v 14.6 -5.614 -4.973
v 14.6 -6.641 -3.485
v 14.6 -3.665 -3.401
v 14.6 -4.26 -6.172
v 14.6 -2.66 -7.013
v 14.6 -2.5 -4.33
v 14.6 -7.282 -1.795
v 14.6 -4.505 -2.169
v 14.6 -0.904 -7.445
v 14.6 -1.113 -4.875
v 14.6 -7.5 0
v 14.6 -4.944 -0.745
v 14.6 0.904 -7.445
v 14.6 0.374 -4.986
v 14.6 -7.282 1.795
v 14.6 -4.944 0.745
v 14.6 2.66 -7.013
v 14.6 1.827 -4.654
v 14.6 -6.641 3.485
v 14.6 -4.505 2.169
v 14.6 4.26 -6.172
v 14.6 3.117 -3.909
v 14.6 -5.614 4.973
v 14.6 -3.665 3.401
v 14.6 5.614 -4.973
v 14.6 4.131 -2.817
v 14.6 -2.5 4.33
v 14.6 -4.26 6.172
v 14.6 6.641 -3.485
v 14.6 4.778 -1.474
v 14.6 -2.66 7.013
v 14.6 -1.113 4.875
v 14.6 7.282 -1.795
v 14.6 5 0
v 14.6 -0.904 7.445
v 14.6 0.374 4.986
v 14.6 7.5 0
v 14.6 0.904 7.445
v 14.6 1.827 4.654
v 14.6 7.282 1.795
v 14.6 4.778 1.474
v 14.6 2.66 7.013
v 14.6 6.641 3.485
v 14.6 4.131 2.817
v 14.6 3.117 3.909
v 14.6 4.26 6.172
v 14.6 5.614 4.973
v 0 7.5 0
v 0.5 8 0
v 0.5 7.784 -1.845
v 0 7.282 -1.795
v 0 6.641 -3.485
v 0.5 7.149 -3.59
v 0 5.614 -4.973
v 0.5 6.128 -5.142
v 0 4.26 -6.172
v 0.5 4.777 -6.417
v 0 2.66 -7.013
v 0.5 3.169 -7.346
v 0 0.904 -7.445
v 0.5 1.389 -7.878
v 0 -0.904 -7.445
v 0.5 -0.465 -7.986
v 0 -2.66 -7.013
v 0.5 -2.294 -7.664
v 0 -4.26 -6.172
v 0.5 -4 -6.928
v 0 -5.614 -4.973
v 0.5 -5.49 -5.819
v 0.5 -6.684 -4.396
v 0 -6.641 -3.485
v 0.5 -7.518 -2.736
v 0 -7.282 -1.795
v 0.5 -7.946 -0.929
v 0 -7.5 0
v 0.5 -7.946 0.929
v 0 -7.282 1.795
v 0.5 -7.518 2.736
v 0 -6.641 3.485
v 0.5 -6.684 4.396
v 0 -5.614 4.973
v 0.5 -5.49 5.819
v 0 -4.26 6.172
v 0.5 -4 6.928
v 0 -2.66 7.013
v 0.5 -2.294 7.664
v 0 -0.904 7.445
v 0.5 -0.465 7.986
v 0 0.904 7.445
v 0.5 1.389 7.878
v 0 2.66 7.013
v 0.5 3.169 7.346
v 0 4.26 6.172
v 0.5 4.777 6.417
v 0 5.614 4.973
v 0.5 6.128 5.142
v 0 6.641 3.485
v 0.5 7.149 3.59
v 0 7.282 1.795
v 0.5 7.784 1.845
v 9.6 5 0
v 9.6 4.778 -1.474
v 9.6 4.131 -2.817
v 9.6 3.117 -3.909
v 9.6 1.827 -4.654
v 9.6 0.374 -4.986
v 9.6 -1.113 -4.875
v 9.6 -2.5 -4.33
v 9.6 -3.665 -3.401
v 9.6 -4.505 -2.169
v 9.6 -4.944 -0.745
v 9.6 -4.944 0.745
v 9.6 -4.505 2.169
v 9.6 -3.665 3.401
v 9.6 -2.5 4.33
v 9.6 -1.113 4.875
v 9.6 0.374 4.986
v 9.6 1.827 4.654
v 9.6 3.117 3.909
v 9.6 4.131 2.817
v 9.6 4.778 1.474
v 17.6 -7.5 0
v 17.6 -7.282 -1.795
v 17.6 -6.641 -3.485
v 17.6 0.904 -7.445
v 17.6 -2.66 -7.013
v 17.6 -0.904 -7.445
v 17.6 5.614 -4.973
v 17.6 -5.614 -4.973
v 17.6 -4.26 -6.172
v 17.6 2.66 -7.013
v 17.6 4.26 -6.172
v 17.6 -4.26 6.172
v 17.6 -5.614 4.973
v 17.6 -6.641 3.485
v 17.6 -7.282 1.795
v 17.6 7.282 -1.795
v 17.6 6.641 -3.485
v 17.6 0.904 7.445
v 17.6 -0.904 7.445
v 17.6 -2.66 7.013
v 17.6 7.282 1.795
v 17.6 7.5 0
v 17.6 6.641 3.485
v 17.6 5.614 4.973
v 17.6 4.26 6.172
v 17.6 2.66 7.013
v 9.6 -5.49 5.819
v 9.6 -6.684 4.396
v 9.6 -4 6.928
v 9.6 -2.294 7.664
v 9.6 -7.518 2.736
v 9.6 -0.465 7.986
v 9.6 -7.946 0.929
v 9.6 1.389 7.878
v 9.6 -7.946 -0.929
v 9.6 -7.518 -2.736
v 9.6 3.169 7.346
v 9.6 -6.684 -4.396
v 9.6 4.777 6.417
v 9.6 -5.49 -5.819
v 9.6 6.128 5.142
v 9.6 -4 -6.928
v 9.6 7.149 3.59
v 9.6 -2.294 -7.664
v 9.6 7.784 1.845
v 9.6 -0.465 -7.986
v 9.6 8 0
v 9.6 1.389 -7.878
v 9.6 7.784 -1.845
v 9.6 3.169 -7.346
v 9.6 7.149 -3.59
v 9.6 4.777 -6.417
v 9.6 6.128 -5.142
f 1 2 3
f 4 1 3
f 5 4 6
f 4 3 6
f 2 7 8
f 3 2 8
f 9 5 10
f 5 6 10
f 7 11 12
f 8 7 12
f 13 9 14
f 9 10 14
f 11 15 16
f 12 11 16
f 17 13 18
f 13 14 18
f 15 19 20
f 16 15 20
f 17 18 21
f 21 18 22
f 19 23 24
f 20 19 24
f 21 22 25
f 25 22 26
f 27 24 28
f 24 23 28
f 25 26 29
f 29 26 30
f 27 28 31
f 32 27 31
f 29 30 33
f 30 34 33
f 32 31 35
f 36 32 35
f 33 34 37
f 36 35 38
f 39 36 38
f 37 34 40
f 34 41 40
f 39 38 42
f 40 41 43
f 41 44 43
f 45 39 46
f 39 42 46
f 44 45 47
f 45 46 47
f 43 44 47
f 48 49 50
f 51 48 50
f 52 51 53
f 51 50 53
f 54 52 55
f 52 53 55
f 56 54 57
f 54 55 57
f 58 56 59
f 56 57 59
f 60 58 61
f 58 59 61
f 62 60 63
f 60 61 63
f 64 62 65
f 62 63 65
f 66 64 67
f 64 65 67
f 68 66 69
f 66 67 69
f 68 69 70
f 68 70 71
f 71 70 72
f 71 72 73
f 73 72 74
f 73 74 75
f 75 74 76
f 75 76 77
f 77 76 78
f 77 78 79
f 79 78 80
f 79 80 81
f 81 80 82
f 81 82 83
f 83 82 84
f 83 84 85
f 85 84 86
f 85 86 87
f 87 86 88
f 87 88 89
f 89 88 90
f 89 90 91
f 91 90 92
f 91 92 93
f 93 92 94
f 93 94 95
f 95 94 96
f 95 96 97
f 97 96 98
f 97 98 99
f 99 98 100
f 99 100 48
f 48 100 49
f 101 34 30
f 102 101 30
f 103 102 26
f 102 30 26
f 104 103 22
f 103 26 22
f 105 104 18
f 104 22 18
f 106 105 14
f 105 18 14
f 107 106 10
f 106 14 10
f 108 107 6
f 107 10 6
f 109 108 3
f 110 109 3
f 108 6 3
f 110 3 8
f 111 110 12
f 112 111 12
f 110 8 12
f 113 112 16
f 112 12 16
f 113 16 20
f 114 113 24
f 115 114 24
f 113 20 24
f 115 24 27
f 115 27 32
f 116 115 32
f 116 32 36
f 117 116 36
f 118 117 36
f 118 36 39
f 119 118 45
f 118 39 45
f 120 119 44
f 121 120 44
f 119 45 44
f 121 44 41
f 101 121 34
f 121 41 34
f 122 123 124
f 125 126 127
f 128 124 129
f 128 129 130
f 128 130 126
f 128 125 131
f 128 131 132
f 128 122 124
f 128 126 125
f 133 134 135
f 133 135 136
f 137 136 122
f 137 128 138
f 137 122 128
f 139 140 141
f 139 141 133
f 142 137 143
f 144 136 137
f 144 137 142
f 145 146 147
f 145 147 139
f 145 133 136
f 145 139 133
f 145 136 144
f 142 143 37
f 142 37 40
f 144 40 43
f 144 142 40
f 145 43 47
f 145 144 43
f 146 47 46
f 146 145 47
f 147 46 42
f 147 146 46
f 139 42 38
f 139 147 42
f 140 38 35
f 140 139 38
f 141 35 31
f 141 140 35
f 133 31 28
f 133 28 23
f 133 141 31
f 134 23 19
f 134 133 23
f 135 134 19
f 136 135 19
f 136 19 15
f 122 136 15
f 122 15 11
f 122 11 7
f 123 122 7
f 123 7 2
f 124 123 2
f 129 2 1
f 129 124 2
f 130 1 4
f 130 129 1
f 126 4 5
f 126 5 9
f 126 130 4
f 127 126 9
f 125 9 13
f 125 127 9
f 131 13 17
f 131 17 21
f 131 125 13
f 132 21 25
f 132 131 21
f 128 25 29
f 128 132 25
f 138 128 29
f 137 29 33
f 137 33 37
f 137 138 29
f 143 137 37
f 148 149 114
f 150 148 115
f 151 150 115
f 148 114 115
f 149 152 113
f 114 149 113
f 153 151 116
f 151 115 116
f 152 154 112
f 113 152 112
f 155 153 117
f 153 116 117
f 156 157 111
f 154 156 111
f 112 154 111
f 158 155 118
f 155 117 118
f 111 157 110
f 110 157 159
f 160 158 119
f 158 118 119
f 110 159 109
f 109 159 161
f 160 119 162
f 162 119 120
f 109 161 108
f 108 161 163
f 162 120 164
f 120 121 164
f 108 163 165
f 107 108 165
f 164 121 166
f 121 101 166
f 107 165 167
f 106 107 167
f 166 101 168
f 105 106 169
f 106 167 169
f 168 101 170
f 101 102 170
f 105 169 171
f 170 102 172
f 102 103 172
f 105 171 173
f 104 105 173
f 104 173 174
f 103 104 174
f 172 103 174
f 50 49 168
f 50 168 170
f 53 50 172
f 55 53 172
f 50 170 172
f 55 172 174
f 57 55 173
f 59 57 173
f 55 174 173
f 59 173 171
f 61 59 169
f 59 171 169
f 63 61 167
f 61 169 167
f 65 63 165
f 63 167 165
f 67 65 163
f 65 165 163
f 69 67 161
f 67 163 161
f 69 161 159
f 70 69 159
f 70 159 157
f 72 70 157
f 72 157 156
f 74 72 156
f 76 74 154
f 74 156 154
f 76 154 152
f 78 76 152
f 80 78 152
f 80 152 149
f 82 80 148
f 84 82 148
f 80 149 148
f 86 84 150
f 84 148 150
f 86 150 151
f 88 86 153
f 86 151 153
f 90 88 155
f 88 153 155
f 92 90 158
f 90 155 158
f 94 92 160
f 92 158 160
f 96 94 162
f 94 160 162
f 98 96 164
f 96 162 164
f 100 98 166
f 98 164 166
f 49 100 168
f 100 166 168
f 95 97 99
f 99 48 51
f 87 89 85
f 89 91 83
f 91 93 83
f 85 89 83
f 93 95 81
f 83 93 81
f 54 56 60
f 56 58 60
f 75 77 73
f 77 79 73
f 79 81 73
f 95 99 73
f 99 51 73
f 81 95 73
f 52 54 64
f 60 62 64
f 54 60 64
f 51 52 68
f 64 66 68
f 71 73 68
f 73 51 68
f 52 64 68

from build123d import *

# Parameters (mm, degrees)
CHAMFER1_SIZE       = 0.5
SKETCH2_R           = 7.5
SKETCH2_R_2         = 5
BOSS_EXTRUDE1_DEPTH = 3


with BuildPart() as part:
    # Sketch1 → Revolve1 (revolve)
    with BuildSketch(Plane.XY):
        Polygon((0, 0), (0, 8), (9.6, 8), (9.6, 5), (17.6, 5), (17.6, 0), align=None)
    revolve(axis=Axis((17.6, 0, 0), (-1, 0, 0)))

    # Chamfer1
    chamfer1_edges = [part.edges().sort_by_distance(p)[0] for p in [
        (0, -8, 0),
    ]]
    chamfer(chamfer1_edges, length=CHAMFER1_SIZE)

    # Sketch2 → Boss-Extrude1 (add)
    with BuildSketch(Plane(origin=(17.6, 0, 0), x_dir=(0, 0, -1), z_dir=(1, 0, 0))):
        with Locations(Location((0, 0, 0), (0, 0, 90))):
            Circle(SKETCH2_R)
        with Locations(Location((0, 0, 0), (0, 0, 90))):
            Circle(SKETCH2_R_2, mode=Mode.SUBTRACT)
    extrude(amount=-BOSS_EXTRUDE1_DEPTH)


solid = part.part
